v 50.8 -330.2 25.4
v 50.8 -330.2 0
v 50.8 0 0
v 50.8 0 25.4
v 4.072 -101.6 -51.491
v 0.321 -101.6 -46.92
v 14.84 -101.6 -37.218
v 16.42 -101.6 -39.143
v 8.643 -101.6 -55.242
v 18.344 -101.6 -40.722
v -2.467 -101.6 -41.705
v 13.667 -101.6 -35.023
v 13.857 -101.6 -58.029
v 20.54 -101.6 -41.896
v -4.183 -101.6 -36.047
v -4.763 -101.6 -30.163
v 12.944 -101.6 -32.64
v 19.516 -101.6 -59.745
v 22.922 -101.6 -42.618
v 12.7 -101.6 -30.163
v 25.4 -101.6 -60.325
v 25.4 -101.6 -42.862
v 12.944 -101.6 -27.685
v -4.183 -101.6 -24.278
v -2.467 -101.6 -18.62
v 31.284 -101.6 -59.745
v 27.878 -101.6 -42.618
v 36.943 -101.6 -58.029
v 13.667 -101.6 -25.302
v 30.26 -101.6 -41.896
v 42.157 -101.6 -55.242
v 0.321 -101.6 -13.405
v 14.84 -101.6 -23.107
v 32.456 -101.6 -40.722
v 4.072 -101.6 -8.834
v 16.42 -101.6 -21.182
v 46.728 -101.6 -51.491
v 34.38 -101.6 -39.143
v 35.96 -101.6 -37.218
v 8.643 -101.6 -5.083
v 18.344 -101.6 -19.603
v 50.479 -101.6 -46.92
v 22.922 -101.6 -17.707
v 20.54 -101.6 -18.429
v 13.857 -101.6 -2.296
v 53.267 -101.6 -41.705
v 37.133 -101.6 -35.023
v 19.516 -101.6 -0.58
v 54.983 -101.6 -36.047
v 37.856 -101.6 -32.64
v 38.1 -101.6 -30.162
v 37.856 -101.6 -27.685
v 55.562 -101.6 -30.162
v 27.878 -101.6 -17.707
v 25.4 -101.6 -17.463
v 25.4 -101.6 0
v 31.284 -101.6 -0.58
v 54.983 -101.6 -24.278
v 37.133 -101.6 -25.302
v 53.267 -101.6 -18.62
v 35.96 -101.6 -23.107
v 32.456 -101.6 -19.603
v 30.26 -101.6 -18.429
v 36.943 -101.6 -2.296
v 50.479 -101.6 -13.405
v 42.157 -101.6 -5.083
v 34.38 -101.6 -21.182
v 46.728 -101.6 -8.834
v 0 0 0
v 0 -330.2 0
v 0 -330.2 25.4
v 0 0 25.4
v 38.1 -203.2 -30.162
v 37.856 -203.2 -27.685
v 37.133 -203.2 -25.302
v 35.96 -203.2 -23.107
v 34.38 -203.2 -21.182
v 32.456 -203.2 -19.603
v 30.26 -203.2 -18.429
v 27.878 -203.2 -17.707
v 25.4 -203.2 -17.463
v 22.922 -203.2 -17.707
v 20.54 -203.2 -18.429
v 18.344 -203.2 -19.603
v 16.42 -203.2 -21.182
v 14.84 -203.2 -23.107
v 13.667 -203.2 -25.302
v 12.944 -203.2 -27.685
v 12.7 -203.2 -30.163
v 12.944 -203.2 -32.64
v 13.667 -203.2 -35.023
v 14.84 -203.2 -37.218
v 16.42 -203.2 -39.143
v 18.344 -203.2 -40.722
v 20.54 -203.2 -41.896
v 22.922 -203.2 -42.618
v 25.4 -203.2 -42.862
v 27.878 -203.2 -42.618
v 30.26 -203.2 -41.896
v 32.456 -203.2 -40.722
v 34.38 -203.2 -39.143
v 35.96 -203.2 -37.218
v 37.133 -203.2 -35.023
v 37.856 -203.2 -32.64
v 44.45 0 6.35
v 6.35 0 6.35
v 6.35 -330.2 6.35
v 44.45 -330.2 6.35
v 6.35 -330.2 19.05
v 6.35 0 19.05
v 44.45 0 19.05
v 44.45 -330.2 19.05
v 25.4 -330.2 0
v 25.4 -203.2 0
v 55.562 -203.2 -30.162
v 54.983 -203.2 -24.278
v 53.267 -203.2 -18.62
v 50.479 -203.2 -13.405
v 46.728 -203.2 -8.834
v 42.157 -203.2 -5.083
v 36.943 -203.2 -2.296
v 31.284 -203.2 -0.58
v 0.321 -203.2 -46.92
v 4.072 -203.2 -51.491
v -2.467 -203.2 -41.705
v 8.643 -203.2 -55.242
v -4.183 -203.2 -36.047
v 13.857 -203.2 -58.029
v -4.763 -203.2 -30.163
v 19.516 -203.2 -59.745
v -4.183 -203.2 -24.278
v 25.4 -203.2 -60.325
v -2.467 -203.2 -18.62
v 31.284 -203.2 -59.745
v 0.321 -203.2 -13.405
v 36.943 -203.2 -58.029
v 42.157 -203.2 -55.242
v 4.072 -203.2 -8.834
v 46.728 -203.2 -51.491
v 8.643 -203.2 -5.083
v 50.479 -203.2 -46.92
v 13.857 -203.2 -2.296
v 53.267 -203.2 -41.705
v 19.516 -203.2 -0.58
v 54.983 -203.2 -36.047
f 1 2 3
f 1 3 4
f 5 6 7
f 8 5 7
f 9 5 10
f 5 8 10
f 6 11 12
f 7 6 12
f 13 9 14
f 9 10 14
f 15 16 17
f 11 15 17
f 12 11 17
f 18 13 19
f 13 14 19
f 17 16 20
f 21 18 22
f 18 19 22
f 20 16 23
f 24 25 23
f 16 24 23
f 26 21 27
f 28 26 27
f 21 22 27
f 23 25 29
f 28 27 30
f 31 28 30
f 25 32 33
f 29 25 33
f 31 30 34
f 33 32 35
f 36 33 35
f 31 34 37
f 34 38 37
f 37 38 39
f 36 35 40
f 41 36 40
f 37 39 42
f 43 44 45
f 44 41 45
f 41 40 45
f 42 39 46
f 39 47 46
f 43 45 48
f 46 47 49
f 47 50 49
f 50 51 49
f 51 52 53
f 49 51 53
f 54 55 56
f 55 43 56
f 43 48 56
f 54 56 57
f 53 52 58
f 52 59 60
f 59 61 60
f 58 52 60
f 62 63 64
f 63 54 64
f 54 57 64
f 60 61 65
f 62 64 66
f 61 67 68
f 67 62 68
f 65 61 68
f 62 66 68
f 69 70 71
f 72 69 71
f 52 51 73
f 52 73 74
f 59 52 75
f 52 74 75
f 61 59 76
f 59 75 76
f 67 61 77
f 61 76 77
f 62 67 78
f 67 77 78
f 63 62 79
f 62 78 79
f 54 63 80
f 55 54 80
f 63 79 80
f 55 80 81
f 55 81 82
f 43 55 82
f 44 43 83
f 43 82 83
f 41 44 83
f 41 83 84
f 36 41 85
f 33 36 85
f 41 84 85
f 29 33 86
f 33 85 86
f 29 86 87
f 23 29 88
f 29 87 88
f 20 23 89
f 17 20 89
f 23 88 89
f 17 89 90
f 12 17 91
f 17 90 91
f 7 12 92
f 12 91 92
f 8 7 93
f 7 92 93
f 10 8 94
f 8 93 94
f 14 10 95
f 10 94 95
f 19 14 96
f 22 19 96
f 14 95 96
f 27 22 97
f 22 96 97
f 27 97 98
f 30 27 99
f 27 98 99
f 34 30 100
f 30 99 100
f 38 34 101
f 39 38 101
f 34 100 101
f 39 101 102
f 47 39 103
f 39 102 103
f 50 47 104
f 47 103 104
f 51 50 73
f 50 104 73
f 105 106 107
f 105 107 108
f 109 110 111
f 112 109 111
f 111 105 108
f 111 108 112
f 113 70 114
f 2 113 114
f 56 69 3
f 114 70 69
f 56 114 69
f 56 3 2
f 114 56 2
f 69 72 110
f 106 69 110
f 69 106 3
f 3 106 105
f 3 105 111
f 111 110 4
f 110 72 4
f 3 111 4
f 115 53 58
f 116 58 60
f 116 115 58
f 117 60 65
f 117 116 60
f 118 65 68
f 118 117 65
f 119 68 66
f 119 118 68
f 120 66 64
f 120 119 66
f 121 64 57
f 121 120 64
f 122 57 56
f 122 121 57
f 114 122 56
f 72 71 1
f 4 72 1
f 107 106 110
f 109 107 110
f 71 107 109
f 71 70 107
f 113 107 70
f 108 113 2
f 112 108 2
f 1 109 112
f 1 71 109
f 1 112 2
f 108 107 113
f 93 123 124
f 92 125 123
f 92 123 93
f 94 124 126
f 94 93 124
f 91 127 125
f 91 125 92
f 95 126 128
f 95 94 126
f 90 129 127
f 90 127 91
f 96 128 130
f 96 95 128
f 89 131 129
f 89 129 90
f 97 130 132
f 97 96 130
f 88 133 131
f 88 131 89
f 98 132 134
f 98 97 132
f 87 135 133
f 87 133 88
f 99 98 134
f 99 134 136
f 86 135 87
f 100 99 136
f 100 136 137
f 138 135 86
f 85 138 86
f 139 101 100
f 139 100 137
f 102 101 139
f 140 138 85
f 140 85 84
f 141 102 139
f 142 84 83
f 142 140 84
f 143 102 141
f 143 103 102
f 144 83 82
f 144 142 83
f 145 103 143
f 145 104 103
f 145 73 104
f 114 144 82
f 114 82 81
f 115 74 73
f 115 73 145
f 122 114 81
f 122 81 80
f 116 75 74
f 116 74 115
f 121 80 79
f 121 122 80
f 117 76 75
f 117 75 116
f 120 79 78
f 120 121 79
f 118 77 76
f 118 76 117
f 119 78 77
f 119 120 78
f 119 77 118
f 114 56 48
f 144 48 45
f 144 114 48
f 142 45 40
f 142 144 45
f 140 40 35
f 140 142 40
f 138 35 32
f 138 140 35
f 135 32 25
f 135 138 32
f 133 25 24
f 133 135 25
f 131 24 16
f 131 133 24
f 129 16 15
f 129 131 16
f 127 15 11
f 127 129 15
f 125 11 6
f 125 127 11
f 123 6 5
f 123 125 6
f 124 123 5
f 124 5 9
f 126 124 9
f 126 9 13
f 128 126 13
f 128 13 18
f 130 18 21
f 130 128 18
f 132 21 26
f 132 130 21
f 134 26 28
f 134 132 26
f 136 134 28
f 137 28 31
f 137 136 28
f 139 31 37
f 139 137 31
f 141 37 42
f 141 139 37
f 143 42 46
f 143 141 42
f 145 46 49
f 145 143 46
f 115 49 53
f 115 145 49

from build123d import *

# Parameters (mm, degrees)
F0_W     = 50.8
F0_H     = 25.4
F0_W_2   = 38.1
F0_H_2   = 12.7
F1_DEPTH = 330.2
F2_R     = 30.1625
F3_DEPTH = 228.6
F4_R     = 30.1625
F5_DEPTH = 127
F6_R     = 12.7
F7_DEPTH = 101.6


# Not quite as in the source:
# - a feature names something its author has since deleted; it is built from what else it names


with BuildPart() as f1:
    # F0 (on Front) → F1 (new body)
    with BuildSketch(Plane.XZ):
        with Locations((25.4, 12.7)):
            Rectangle(F0_W, F0_H)
        with Locations((25.4, 12.7)):
            Rectangle(F0_W_2, F0_H_2, mode=Mode.SUBTRACT)
    extrude(amount=F1_DEPTH)

    # F2 (on face) → F3 (join)
    with BuildSketch(Plane.XZ.offset(330.2)):
        with Locations((25.4, -30.1625)):
            Circle(F2_R)
    extrude(amount=-F3_DEPTH)

    # F4 (on face) → F5 (cut)
    with BuildSketch(Plane.XZ.offset(330.2)):
        with Locations((25.4, -30.1625)):
            Circle(F4_R)
    extrude(amount=-F5_DEPTH, mode=Mode.SUBTRACT)

    # F6 (on face) → F7 (cut, through all)
    with BuildSketch(Plane.XZ.offset(203.2)):
        with Locations((25.4, -30.1625)):
            Circle(F6_R)
    extrude(amount=-F7_DEPTH, mode=Mode.SUBTRACT)


solid = f1.part
